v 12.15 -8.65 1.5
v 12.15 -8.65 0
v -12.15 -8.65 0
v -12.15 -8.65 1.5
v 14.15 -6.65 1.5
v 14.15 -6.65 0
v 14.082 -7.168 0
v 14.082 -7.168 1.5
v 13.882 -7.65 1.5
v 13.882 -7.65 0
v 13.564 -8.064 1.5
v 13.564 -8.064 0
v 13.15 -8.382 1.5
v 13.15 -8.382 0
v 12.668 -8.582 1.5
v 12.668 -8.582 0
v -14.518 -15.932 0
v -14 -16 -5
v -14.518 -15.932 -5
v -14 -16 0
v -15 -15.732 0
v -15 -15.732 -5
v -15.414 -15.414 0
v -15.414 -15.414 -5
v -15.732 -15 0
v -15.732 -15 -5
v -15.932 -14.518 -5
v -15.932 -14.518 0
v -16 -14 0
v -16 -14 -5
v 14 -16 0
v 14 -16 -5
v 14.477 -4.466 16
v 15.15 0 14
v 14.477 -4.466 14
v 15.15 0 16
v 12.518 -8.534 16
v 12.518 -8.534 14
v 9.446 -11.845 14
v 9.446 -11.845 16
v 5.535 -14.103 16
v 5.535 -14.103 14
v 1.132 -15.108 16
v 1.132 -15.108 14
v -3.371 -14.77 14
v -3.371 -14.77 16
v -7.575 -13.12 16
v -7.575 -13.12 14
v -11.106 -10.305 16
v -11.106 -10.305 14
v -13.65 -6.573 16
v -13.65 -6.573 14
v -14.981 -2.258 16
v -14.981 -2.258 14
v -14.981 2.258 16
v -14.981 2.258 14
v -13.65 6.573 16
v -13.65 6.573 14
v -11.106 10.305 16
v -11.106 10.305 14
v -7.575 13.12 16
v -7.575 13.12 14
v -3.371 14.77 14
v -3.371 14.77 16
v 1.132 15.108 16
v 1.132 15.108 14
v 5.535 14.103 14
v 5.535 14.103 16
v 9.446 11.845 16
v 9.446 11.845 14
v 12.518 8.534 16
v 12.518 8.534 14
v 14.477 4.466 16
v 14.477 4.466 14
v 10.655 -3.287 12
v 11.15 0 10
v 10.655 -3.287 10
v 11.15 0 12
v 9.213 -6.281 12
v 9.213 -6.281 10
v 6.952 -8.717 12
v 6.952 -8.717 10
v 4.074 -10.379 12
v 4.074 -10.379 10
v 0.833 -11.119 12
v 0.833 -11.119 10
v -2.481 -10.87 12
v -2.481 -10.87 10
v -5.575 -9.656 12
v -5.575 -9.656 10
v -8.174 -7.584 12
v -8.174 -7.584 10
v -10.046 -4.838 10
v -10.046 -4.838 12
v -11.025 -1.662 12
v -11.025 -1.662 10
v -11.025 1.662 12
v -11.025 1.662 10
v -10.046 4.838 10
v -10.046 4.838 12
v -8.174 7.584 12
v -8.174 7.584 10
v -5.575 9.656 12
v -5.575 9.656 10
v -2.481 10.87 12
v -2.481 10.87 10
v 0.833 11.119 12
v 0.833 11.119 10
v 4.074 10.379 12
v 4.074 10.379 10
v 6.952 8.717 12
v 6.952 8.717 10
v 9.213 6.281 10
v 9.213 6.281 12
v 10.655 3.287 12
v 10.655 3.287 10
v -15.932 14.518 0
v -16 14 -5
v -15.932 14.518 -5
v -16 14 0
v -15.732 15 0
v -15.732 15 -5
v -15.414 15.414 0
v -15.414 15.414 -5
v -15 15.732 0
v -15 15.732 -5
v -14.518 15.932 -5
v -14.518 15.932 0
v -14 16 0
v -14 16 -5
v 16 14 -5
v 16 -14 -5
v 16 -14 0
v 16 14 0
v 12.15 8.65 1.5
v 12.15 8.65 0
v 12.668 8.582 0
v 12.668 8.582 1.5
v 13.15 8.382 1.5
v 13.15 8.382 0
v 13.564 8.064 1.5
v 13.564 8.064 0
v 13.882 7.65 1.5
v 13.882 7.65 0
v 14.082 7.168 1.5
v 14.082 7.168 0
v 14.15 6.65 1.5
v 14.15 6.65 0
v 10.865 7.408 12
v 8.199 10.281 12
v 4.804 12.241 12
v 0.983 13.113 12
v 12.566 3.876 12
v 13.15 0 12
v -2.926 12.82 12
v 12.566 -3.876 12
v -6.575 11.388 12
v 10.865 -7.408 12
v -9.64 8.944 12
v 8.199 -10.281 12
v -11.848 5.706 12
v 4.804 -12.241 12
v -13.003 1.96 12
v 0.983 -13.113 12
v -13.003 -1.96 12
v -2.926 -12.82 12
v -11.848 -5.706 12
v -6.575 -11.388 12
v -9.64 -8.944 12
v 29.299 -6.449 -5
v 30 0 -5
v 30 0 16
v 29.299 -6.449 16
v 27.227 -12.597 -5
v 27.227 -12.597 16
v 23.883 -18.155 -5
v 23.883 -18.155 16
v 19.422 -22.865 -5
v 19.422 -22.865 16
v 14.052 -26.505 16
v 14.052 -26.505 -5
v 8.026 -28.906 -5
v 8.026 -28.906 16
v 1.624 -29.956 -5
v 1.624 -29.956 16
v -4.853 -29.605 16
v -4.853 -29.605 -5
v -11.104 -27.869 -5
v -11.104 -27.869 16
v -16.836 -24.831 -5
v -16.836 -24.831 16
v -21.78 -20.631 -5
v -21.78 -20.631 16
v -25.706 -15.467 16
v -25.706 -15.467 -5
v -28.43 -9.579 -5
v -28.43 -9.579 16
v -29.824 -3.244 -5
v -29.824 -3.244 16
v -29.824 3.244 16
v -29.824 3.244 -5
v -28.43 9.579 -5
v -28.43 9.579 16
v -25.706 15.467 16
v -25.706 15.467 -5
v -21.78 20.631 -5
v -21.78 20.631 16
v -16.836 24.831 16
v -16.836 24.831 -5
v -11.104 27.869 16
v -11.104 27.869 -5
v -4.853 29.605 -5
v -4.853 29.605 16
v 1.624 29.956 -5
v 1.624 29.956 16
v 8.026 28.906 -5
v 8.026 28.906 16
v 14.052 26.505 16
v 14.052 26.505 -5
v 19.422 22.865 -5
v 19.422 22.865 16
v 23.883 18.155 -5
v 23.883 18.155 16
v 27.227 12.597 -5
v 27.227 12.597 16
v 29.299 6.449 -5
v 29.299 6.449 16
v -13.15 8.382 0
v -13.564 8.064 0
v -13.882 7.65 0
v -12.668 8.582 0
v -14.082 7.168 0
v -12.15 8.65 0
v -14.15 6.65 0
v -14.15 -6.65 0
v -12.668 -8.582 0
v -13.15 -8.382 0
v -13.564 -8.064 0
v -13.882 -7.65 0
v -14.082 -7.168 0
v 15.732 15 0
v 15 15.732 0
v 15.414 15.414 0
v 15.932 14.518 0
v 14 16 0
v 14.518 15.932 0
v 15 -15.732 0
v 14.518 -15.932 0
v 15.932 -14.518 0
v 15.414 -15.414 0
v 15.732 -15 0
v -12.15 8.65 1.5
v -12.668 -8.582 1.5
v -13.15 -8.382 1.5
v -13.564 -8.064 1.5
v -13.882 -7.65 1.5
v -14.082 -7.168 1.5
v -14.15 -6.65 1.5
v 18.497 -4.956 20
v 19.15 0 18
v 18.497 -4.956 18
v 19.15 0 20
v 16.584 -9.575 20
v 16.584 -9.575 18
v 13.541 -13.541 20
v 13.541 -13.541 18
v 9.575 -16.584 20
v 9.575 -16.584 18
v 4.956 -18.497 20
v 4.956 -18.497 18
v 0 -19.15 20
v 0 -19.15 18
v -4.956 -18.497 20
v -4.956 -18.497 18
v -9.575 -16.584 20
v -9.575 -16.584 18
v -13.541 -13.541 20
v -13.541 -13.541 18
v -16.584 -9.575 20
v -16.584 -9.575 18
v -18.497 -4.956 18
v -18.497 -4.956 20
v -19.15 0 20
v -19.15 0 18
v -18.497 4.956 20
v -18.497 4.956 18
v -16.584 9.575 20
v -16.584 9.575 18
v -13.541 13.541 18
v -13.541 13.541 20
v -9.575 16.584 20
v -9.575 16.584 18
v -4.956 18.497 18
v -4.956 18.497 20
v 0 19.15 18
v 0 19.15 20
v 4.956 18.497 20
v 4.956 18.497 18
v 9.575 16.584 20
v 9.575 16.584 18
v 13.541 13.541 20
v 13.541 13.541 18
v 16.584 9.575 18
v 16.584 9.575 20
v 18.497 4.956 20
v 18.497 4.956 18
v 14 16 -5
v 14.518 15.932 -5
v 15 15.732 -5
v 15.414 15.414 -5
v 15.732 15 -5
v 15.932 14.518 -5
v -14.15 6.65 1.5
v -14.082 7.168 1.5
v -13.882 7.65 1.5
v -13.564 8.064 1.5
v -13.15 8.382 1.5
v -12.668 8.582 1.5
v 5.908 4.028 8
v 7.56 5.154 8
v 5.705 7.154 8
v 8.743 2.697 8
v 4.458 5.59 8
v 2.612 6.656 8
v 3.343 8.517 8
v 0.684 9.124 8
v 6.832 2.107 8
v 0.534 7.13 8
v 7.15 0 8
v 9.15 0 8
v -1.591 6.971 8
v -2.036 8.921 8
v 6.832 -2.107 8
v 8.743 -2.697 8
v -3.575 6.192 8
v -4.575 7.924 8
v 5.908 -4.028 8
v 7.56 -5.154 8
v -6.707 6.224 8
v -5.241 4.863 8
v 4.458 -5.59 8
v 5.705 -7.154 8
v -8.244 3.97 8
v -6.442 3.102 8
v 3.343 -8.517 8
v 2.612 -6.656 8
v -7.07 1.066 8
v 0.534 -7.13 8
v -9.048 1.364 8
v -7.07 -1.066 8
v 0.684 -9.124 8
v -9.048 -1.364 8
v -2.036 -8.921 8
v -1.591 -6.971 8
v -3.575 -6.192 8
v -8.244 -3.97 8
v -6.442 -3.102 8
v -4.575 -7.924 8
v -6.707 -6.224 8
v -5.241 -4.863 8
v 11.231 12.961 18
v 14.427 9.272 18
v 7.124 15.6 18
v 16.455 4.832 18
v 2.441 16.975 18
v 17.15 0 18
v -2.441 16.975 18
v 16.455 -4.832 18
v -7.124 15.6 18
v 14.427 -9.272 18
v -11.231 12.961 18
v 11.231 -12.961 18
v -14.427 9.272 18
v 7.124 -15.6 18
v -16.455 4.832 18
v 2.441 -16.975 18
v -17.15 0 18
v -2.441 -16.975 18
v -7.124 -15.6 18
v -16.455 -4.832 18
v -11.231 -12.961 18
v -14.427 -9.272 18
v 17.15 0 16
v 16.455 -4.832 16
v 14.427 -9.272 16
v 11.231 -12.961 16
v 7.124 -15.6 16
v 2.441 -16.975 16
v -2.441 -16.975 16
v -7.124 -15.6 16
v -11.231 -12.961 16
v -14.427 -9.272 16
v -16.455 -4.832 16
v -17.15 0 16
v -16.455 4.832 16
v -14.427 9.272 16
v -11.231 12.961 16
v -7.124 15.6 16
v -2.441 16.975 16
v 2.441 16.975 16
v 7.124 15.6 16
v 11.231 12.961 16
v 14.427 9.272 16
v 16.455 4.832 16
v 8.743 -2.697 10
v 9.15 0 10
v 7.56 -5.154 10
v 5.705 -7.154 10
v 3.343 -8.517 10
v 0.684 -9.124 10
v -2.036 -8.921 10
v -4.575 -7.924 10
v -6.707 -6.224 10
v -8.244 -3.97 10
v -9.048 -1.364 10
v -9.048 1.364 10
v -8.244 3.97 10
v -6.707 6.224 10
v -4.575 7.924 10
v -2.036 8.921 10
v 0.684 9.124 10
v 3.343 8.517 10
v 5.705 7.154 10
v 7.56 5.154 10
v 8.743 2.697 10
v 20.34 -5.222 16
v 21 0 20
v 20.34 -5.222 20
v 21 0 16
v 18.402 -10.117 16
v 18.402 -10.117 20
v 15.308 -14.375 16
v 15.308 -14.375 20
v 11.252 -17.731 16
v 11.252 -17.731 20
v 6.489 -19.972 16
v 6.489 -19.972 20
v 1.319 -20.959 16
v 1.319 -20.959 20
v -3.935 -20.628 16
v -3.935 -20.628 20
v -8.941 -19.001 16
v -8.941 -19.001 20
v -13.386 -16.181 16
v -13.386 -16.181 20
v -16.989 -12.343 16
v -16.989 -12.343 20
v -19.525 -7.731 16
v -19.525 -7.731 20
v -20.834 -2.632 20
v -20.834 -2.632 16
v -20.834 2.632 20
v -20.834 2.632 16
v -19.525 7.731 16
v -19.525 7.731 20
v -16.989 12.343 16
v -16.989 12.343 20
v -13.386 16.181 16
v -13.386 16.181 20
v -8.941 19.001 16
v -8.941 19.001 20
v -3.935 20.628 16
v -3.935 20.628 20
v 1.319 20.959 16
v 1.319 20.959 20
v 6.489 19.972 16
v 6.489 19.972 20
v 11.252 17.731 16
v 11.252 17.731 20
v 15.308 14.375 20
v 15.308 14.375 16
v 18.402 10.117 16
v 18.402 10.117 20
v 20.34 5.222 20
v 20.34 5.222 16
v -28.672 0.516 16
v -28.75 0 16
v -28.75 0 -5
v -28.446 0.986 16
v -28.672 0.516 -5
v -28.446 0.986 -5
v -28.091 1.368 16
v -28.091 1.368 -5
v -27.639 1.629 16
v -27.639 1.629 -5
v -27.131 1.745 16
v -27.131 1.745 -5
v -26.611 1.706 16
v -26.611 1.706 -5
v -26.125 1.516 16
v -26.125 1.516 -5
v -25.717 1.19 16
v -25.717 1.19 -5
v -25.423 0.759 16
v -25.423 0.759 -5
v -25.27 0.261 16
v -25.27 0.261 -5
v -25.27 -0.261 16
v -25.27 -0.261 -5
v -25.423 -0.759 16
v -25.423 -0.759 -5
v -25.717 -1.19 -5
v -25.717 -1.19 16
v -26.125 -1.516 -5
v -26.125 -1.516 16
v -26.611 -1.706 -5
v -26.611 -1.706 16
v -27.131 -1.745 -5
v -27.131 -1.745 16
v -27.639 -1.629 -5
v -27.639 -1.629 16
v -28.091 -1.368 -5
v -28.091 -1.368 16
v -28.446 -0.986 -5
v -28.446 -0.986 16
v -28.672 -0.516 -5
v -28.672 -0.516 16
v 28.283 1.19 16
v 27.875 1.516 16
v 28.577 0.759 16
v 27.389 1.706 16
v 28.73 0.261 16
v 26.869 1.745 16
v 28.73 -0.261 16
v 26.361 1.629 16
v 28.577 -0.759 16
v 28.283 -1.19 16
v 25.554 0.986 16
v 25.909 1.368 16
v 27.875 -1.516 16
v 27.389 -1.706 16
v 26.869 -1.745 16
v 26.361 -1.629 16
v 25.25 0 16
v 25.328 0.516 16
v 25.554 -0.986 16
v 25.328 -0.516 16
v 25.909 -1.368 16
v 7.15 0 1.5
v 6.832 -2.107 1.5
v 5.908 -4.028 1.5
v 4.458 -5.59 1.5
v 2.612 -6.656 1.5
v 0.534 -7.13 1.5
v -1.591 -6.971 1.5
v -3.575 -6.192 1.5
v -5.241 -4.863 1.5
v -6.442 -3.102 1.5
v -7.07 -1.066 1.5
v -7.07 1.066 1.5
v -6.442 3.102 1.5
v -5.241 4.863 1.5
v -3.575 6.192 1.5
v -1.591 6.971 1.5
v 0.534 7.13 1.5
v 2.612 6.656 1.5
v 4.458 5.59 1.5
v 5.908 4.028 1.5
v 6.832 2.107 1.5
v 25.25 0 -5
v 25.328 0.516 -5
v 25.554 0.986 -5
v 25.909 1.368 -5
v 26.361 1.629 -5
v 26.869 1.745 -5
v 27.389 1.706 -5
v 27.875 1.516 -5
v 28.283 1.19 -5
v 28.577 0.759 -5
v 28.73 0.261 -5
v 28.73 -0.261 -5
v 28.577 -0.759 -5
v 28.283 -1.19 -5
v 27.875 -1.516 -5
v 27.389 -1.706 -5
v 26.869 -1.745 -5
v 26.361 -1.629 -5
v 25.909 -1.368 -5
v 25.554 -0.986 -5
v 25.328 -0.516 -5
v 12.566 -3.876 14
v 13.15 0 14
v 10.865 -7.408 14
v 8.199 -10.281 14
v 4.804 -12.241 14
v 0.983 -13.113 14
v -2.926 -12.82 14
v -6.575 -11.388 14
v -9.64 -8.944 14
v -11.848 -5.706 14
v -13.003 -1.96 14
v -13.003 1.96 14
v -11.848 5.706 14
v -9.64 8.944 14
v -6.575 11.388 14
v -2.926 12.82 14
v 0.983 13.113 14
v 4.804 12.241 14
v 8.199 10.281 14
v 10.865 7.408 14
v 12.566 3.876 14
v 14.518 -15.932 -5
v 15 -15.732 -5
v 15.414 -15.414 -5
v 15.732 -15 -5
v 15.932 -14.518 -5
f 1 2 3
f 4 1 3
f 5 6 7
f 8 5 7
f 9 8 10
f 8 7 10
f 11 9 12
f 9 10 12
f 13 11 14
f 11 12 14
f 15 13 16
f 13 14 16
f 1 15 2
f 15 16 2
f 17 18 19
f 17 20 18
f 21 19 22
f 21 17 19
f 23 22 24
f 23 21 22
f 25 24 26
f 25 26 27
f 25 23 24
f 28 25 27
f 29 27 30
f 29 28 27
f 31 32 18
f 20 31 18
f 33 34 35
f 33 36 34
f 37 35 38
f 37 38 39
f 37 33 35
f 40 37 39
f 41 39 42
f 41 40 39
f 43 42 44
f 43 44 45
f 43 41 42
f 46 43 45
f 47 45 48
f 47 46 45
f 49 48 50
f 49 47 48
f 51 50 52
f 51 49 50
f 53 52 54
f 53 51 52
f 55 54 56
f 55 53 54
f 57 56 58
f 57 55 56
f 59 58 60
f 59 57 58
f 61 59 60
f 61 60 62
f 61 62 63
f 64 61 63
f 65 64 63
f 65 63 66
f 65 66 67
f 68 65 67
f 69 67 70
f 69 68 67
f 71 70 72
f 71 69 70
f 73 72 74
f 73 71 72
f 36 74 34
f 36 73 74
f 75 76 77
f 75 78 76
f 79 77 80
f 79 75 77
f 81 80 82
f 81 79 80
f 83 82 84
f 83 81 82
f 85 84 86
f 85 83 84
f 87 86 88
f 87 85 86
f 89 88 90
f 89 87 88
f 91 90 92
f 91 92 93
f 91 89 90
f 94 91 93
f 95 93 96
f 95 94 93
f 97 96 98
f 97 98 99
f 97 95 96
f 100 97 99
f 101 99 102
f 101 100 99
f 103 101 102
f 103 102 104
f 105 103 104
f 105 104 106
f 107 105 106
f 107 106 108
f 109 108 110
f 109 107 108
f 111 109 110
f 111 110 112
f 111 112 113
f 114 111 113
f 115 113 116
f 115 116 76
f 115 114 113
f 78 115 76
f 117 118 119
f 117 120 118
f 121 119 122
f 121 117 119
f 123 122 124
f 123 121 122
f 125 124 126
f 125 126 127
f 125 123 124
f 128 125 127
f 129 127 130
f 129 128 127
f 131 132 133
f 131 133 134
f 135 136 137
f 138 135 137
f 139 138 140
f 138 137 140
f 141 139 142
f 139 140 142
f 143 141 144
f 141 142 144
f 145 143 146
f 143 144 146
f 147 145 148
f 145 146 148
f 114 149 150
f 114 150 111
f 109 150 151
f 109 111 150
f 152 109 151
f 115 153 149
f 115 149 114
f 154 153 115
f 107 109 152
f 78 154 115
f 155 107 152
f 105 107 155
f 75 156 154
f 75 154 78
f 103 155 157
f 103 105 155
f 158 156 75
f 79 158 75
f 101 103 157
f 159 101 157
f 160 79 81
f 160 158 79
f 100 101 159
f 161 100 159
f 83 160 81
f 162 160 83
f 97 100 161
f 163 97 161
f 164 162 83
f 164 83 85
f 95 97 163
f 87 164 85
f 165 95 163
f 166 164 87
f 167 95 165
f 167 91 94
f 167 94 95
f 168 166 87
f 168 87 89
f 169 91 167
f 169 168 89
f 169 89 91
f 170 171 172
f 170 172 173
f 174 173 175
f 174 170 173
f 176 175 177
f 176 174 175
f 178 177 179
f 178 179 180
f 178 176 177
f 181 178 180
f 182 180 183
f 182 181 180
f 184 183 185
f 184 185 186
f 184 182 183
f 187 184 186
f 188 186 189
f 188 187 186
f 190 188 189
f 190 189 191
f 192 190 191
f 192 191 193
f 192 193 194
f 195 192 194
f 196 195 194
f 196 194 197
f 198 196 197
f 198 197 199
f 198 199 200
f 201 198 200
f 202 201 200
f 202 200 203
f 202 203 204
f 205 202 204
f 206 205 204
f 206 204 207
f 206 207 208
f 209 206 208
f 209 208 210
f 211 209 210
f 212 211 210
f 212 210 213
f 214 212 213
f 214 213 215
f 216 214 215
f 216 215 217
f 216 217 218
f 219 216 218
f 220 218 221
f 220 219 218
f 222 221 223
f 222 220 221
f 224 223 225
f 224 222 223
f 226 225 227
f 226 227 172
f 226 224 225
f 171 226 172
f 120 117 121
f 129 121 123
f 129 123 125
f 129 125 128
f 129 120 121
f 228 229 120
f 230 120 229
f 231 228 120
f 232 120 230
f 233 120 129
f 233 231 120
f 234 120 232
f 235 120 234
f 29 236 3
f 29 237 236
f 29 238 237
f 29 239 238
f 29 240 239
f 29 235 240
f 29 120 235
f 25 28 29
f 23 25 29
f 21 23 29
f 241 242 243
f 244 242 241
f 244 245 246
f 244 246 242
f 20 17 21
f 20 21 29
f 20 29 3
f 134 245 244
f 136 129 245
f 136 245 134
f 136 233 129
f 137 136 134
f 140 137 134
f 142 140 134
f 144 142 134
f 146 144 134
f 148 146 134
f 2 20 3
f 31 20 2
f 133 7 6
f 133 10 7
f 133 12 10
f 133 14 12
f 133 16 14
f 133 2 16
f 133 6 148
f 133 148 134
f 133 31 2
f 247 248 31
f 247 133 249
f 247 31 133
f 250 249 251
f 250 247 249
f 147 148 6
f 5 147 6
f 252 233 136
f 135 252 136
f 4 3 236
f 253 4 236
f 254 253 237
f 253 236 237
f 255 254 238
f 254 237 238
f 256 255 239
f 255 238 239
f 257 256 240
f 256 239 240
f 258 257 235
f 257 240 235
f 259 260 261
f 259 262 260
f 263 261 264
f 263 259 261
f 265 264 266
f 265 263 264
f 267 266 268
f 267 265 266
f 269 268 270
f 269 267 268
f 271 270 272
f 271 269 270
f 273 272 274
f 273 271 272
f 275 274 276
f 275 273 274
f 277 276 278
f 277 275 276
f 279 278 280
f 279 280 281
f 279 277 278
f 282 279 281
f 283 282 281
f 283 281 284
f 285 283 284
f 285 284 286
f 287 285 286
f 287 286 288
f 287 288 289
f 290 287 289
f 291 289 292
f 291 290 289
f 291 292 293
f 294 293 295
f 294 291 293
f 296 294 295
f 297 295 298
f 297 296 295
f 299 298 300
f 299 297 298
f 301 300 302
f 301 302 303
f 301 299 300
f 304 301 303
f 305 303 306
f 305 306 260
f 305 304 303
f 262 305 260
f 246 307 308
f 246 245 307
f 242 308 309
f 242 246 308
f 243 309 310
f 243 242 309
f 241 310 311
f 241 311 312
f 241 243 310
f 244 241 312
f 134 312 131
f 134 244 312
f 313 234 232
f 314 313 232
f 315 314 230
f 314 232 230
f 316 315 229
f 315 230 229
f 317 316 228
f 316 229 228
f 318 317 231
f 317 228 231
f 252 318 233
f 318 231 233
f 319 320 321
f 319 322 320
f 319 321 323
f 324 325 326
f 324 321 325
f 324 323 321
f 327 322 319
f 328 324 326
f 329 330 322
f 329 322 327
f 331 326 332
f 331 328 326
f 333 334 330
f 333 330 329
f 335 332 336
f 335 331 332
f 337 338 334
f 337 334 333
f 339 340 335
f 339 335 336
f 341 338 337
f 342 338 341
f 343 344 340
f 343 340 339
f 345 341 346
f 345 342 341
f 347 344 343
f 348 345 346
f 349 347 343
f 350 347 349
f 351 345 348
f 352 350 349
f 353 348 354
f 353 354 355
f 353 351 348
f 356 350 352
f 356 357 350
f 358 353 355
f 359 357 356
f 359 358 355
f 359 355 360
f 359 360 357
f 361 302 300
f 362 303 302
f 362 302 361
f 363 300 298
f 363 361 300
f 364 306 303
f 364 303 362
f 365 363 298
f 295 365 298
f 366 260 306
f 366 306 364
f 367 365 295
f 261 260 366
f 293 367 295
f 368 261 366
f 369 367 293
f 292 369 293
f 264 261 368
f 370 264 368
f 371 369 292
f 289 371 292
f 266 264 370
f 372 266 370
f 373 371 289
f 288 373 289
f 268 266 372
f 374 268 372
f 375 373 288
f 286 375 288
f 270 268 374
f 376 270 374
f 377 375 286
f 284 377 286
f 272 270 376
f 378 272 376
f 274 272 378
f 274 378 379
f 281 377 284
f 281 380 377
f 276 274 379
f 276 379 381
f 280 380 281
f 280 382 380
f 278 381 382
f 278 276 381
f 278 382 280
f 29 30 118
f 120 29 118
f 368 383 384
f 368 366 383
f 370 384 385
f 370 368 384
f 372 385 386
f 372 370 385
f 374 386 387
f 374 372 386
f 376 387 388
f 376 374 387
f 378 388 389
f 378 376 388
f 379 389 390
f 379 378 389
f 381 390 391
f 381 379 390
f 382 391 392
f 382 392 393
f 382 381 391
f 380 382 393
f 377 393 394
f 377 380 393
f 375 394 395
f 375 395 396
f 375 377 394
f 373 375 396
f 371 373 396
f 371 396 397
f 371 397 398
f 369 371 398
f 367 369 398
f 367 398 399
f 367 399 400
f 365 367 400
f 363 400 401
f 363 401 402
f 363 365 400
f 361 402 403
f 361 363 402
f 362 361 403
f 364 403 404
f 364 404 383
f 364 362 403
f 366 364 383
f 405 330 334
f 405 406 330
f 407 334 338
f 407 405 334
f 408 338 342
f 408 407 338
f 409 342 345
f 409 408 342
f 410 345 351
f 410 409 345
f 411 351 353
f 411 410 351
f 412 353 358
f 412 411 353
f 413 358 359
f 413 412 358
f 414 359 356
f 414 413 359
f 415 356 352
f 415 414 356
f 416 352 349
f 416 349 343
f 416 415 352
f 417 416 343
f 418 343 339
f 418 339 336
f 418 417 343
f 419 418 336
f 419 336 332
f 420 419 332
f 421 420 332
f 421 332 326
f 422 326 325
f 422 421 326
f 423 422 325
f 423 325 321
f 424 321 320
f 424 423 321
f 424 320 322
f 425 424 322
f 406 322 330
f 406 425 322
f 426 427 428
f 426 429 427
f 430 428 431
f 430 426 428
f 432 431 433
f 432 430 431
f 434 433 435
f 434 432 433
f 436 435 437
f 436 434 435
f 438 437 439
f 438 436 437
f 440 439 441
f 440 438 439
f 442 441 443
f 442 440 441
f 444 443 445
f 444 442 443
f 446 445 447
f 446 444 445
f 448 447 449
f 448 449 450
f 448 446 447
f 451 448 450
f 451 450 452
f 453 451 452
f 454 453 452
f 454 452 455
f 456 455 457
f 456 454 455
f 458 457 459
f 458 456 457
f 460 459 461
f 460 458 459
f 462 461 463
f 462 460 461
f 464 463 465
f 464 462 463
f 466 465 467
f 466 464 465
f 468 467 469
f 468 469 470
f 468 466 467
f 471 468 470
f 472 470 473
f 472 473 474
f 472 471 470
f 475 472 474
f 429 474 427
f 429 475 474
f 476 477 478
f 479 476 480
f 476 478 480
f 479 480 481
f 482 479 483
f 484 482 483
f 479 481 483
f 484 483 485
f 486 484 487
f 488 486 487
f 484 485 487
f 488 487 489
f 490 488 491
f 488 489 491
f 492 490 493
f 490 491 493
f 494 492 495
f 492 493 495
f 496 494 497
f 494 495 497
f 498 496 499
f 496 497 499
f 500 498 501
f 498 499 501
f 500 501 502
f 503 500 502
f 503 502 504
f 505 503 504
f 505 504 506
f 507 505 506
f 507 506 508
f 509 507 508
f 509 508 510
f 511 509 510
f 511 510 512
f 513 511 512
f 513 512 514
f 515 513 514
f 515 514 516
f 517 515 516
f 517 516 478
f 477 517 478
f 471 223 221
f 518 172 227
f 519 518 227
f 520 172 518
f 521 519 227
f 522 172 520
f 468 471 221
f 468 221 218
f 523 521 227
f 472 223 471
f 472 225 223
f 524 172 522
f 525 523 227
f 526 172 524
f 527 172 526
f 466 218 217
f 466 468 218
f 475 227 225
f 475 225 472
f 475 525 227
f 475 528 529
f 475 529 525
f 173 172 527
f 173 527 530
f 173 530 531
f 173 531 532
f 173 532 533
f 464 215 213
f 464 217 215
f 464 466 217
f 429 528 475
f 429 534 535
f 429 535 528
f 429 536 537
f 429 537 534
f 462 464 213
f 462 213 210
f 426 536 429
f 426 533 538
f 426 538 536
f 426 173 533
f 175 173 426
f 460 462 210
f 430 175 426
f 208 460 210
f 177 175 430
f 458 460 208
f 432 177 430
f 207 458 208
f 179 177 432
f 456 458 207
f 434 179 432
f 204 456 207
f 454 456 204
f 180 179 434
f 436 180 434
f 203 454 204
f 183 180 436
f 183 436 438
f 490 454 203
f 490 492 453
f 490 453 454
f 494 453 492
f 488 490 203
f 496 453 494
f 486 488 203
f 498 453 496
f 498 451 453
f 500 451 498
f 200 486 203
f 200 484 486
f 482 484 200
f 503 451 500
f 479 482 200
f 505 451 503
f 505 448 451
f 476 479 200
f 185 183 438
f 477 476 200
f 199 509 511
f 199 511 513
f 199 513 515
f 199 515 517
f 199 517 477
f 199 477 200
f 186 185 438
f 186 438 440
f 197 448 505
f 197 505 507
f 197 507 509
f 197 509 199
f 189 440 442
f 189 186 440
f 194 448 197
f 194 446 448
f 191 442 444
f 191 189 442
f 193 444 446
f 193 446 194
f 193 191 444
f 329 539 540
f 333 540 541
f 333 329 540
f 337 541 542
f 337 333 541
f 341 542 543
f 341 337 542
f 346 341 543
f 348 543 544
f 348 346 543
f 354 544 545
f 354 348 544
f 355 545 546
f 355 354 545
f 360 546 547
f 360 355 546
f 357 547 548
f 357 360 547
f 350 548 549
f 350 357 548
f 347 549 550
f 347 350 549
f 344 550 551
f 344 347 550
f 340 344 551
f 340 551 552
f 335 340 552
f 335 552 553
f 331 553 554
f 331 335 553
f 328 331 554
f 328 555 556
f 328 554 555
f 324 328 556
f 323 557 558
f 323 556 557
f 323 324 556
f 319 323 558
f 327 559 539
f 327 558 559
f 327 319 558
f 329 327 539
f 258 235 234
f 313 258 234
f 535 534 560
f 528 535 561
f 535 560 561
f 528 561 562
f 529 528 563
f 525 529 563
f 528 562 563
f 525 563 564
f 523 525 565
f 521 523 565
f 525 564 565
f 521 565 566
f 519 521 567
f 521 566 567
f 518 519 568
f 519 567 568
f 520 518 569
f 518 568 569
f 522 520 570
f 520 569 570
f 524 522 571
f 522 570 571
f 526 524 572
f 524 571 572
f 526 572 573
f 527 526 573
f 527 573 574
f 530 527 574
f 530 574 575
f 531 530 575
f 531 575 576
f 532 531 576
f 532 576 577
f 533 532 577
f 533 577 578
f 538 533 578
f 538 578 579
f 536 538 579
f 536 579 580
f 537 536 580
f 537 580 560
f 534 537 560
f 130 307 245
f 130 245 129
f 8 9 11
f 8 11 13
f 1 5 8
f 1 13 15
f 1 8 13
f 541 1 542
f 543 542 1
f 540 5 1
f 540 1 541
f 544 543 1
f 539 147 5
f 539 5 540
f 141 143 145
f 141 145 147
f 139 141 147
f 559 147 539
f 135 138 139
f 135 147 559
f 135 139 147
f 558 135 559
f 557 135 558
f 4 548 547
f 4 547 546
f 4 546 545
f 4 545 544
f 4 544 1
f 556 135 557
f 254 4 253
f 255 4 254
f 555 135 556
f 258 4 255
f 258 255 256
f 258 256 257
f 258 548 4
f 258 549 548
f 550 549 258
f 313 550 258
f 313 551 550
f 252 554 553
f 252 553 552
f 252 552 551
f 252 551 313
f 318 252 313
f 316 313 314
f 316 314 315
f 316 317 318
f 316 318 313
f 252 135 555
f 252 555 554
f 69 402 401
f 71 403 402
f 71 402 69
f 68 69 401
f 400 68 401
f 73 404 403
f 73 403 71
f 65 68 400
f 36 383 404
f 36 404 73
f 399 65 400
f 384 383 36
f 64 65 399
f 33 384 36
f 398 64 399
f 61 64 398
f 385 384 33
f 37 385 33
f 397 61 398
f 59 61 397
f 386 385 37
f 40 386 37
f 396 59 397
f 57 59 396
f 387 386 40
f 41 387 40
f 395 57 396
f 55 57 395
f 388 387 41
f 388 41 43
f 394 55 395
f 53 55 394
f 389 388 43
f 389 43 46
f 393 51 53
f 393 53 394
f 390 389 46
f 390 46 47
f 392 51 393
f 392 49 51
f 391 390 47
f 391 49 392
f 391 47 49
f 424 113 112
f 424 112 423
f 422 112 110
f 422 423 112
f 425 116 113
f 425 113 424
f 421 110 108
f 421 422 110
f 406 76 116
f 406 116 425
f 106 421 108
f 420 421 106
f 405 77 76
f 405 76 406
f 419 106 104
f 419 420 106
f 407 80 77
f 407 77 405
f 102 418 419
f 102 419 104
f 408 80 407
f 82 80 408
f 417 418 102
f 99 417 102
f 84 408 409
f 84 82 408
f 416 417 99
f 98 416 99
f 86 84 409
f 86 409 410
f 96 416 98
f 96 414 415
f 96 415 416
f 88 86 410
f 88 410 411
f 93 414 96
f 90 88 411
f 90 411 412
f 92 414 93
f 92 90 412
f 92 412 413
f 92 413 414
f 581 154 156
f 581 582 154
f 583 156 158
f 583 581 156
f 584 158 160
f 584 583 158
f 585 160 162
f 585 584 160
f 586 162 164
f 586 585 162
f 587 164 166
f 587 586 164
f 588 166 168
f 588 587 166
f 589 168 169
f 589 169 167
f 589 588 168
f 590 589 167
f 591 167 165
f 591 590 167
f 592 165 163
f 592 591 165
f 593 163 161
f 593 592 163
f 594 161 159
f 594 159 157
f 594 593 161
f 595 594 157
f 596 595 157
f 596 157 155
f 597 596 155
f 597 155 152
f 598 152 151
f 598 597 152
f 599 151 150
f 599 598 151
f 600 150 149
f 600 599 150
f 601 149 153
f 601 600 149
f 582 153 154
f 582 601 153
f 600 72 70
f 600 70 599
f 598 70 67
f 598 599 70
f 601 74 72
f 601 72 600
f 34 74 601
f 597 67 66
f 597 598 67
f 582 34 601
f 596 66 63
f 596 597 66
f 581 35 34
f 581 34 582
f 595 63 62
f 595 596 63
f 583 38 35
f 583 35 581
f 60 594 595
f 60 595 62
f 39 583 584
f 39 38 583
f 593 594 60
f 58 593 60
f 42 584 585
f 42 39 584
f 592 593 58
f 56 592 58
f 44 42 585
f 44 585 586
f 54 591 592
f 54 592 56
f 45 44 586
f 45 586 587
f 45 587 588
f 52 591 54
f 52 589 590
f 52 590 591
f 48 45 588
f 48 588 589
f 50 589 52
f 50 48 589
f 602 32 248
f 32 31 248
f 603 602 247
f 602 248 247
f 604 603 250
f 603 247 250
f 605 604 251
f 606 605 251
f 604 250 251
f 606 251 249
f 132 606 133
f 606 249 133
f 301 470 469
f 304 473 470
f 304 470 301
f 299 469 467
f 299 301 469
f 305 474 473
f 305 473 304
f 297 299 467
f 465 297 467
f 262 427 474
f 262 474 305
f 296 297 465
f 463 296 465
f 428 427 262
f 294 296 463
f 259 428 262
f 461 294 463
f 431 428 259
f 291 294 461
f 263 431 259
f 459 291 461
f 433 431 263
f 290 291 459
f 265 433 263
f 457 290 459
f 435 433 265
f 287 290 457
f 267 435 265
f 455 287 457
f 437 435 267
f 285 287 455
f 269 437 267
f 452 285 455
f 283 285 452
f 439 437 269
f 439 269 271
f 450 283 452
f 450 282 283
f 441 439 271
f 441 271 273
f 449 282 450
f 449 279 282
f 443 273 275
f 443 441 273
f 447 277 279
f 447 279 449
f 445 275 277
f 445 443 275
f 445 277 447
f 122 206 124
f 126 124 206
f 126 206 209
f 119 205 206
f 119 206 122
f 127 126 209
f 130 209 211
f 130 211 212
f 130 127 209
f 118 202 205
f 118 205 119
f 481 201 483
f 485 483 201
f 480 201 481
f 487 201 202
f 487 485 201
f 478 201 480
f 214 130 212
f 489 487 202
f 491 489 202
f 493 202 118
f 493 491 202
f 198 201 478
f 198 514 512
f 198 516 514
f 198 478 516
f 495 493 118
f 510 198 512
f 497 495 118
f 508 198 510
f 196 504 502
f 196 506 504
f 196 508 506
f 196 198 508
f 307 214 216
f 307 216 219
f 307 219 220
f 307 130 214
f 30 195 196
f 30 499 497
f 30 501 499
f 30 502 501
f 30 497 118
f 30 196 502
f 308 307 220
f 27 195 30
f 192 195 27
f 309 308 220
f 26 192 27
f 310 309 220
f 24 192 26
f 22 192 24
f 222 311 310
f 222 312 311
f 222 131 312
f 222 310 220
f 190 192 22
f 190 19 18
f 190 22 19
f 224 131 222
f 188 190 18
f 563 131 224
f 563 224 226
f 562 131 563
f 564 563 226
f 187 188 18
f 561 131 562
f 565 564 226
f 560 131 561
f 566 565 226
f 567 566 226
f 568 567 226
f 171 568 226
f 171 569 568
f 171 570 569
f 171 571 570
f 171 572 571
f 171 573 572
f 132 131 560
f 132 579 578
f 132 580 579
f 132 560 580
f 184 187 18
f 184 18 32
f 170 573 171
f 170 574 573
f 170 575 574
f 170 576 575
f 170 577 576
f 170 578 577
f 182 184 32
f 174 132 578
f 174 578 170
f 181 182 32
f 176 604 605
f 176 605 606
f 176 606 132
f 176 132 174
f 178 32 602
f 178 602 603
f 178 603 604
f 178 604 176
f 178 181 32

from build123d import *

# Parameters (mm, degrees)
BOSS_EXTRUDE1_START = 5
SKETCH2_R           = 30
SKETCH2_W           = 32
SKETCH2_H           = 32
BOSS_EXTRUDE1_DEPTH = 5
FILLET1_R           = 2
SKETCH3_2_R         = 1.75
CUT_EXTRUDE3_DEPTH  = 50.244289009
CUT_EXTRUDE4_DEPTH  = 1.5


with BuildPart() as part:
    # Sketch1 → Revolve1 (revolve)
    with BuildSketch(Plane(origin=(0, 0, 0), x_dir=(0, 0, -1), z_dir=(1, 0, 0))):
        Polygon((-16, 30), (0, 30), (0, 7.15), (-8, 7.15), (-8, 9.15), (-10, 9.15), (-10, 11.15), (-12, 11.15), (-12, 13.15), (-14, 13.15), (-14, 15.15), (-16, 15.15), (-16, 17.15), (-18, 17.15), (-18, 19.15), (-20, 19.15), (-20, 21), (-16, 21), align=None)
    revolve(axis=Axis((0, 0, 0), (0, 0, -1)))

    # Sketch2 → Boss-Extrude1 (add)
    with BuildSketch(Plane(origin=(0, 0, 0), x_dir=(-1, 0, 0), z_dir=(0, 0, -1)).offset(BOSS_EXTRUDE1_START)):
        Circle(SKETCH2_R)
        Rectangle(SKETCH2_W, SKETCH2_H, mode=Mode.SUBTRACT)
    extrude(amount=-BOSS_EXTRUDE1_DEPTH)

    # Fillet1
    fillet1_edges = [part.edges().sort_by_distance(p)[0] for p in [
        (16, -16, -2.5),
        (-16, -16, -2.5),
        (16, 16, -2.5),
        (-16, 16, -2.5),
    ]]
    fillet(fillet1_edges, radius=FILLET1_R)

    # Sketch3<2> → Cut-Extrude3 (cut, through all)
    with BuildSketch(Plane(origin=(0, 0, -5), x_dir=(-1, 0, 0), z_dir=(0, 0, -1))):
        with Locations((-27, 0)):
            Circle(SKETCH3_2_R)
        with Locations((27, 0)):
            Circle(SKETCH3_2_R)
    extrude(amount=-CUT_EXTRUDE3_DEPTH, mode=Mode.SUBTRACT)

    # Sketch4 → Cut-Extrude4 (cut)
    with BuildSketch(Plane(origin=(0, 0, 0), x_dir=(-1, 0, 0), z_dir=(0, 0, -1))):
        with BuildLine():
            Line((-12.15, -8.65), (12.15, -8.65))
            ThreePointArc((12.15, -8.65), (13.564213562, -8.064213562), (14.15, -6.65))
            Line((14.15, -6.65), (14.15, 6.65))
            ThreePointArc((14.15, 6.65), (13.564213562, 8.064213562), (12.15, 8.65))
            Line((12.15, 8.65), (-12.15, 8.65))
            ThreePointArc((-12.15, 8.65), (-13.564213562, 8.064213562), (-14.15, 6.65))
            Line((-14.15, 6.65), (-14.15, -6.65))
            ThreePointArc((-14.15, -6.65), (-13.564213562, -8.064213562), (-12.15, -8.65))
        make_face()
    extrude(amount=-CUT_EXTRUDE4_DEPTH, mode=Mode.SUBTRACT)


solid = part.part
